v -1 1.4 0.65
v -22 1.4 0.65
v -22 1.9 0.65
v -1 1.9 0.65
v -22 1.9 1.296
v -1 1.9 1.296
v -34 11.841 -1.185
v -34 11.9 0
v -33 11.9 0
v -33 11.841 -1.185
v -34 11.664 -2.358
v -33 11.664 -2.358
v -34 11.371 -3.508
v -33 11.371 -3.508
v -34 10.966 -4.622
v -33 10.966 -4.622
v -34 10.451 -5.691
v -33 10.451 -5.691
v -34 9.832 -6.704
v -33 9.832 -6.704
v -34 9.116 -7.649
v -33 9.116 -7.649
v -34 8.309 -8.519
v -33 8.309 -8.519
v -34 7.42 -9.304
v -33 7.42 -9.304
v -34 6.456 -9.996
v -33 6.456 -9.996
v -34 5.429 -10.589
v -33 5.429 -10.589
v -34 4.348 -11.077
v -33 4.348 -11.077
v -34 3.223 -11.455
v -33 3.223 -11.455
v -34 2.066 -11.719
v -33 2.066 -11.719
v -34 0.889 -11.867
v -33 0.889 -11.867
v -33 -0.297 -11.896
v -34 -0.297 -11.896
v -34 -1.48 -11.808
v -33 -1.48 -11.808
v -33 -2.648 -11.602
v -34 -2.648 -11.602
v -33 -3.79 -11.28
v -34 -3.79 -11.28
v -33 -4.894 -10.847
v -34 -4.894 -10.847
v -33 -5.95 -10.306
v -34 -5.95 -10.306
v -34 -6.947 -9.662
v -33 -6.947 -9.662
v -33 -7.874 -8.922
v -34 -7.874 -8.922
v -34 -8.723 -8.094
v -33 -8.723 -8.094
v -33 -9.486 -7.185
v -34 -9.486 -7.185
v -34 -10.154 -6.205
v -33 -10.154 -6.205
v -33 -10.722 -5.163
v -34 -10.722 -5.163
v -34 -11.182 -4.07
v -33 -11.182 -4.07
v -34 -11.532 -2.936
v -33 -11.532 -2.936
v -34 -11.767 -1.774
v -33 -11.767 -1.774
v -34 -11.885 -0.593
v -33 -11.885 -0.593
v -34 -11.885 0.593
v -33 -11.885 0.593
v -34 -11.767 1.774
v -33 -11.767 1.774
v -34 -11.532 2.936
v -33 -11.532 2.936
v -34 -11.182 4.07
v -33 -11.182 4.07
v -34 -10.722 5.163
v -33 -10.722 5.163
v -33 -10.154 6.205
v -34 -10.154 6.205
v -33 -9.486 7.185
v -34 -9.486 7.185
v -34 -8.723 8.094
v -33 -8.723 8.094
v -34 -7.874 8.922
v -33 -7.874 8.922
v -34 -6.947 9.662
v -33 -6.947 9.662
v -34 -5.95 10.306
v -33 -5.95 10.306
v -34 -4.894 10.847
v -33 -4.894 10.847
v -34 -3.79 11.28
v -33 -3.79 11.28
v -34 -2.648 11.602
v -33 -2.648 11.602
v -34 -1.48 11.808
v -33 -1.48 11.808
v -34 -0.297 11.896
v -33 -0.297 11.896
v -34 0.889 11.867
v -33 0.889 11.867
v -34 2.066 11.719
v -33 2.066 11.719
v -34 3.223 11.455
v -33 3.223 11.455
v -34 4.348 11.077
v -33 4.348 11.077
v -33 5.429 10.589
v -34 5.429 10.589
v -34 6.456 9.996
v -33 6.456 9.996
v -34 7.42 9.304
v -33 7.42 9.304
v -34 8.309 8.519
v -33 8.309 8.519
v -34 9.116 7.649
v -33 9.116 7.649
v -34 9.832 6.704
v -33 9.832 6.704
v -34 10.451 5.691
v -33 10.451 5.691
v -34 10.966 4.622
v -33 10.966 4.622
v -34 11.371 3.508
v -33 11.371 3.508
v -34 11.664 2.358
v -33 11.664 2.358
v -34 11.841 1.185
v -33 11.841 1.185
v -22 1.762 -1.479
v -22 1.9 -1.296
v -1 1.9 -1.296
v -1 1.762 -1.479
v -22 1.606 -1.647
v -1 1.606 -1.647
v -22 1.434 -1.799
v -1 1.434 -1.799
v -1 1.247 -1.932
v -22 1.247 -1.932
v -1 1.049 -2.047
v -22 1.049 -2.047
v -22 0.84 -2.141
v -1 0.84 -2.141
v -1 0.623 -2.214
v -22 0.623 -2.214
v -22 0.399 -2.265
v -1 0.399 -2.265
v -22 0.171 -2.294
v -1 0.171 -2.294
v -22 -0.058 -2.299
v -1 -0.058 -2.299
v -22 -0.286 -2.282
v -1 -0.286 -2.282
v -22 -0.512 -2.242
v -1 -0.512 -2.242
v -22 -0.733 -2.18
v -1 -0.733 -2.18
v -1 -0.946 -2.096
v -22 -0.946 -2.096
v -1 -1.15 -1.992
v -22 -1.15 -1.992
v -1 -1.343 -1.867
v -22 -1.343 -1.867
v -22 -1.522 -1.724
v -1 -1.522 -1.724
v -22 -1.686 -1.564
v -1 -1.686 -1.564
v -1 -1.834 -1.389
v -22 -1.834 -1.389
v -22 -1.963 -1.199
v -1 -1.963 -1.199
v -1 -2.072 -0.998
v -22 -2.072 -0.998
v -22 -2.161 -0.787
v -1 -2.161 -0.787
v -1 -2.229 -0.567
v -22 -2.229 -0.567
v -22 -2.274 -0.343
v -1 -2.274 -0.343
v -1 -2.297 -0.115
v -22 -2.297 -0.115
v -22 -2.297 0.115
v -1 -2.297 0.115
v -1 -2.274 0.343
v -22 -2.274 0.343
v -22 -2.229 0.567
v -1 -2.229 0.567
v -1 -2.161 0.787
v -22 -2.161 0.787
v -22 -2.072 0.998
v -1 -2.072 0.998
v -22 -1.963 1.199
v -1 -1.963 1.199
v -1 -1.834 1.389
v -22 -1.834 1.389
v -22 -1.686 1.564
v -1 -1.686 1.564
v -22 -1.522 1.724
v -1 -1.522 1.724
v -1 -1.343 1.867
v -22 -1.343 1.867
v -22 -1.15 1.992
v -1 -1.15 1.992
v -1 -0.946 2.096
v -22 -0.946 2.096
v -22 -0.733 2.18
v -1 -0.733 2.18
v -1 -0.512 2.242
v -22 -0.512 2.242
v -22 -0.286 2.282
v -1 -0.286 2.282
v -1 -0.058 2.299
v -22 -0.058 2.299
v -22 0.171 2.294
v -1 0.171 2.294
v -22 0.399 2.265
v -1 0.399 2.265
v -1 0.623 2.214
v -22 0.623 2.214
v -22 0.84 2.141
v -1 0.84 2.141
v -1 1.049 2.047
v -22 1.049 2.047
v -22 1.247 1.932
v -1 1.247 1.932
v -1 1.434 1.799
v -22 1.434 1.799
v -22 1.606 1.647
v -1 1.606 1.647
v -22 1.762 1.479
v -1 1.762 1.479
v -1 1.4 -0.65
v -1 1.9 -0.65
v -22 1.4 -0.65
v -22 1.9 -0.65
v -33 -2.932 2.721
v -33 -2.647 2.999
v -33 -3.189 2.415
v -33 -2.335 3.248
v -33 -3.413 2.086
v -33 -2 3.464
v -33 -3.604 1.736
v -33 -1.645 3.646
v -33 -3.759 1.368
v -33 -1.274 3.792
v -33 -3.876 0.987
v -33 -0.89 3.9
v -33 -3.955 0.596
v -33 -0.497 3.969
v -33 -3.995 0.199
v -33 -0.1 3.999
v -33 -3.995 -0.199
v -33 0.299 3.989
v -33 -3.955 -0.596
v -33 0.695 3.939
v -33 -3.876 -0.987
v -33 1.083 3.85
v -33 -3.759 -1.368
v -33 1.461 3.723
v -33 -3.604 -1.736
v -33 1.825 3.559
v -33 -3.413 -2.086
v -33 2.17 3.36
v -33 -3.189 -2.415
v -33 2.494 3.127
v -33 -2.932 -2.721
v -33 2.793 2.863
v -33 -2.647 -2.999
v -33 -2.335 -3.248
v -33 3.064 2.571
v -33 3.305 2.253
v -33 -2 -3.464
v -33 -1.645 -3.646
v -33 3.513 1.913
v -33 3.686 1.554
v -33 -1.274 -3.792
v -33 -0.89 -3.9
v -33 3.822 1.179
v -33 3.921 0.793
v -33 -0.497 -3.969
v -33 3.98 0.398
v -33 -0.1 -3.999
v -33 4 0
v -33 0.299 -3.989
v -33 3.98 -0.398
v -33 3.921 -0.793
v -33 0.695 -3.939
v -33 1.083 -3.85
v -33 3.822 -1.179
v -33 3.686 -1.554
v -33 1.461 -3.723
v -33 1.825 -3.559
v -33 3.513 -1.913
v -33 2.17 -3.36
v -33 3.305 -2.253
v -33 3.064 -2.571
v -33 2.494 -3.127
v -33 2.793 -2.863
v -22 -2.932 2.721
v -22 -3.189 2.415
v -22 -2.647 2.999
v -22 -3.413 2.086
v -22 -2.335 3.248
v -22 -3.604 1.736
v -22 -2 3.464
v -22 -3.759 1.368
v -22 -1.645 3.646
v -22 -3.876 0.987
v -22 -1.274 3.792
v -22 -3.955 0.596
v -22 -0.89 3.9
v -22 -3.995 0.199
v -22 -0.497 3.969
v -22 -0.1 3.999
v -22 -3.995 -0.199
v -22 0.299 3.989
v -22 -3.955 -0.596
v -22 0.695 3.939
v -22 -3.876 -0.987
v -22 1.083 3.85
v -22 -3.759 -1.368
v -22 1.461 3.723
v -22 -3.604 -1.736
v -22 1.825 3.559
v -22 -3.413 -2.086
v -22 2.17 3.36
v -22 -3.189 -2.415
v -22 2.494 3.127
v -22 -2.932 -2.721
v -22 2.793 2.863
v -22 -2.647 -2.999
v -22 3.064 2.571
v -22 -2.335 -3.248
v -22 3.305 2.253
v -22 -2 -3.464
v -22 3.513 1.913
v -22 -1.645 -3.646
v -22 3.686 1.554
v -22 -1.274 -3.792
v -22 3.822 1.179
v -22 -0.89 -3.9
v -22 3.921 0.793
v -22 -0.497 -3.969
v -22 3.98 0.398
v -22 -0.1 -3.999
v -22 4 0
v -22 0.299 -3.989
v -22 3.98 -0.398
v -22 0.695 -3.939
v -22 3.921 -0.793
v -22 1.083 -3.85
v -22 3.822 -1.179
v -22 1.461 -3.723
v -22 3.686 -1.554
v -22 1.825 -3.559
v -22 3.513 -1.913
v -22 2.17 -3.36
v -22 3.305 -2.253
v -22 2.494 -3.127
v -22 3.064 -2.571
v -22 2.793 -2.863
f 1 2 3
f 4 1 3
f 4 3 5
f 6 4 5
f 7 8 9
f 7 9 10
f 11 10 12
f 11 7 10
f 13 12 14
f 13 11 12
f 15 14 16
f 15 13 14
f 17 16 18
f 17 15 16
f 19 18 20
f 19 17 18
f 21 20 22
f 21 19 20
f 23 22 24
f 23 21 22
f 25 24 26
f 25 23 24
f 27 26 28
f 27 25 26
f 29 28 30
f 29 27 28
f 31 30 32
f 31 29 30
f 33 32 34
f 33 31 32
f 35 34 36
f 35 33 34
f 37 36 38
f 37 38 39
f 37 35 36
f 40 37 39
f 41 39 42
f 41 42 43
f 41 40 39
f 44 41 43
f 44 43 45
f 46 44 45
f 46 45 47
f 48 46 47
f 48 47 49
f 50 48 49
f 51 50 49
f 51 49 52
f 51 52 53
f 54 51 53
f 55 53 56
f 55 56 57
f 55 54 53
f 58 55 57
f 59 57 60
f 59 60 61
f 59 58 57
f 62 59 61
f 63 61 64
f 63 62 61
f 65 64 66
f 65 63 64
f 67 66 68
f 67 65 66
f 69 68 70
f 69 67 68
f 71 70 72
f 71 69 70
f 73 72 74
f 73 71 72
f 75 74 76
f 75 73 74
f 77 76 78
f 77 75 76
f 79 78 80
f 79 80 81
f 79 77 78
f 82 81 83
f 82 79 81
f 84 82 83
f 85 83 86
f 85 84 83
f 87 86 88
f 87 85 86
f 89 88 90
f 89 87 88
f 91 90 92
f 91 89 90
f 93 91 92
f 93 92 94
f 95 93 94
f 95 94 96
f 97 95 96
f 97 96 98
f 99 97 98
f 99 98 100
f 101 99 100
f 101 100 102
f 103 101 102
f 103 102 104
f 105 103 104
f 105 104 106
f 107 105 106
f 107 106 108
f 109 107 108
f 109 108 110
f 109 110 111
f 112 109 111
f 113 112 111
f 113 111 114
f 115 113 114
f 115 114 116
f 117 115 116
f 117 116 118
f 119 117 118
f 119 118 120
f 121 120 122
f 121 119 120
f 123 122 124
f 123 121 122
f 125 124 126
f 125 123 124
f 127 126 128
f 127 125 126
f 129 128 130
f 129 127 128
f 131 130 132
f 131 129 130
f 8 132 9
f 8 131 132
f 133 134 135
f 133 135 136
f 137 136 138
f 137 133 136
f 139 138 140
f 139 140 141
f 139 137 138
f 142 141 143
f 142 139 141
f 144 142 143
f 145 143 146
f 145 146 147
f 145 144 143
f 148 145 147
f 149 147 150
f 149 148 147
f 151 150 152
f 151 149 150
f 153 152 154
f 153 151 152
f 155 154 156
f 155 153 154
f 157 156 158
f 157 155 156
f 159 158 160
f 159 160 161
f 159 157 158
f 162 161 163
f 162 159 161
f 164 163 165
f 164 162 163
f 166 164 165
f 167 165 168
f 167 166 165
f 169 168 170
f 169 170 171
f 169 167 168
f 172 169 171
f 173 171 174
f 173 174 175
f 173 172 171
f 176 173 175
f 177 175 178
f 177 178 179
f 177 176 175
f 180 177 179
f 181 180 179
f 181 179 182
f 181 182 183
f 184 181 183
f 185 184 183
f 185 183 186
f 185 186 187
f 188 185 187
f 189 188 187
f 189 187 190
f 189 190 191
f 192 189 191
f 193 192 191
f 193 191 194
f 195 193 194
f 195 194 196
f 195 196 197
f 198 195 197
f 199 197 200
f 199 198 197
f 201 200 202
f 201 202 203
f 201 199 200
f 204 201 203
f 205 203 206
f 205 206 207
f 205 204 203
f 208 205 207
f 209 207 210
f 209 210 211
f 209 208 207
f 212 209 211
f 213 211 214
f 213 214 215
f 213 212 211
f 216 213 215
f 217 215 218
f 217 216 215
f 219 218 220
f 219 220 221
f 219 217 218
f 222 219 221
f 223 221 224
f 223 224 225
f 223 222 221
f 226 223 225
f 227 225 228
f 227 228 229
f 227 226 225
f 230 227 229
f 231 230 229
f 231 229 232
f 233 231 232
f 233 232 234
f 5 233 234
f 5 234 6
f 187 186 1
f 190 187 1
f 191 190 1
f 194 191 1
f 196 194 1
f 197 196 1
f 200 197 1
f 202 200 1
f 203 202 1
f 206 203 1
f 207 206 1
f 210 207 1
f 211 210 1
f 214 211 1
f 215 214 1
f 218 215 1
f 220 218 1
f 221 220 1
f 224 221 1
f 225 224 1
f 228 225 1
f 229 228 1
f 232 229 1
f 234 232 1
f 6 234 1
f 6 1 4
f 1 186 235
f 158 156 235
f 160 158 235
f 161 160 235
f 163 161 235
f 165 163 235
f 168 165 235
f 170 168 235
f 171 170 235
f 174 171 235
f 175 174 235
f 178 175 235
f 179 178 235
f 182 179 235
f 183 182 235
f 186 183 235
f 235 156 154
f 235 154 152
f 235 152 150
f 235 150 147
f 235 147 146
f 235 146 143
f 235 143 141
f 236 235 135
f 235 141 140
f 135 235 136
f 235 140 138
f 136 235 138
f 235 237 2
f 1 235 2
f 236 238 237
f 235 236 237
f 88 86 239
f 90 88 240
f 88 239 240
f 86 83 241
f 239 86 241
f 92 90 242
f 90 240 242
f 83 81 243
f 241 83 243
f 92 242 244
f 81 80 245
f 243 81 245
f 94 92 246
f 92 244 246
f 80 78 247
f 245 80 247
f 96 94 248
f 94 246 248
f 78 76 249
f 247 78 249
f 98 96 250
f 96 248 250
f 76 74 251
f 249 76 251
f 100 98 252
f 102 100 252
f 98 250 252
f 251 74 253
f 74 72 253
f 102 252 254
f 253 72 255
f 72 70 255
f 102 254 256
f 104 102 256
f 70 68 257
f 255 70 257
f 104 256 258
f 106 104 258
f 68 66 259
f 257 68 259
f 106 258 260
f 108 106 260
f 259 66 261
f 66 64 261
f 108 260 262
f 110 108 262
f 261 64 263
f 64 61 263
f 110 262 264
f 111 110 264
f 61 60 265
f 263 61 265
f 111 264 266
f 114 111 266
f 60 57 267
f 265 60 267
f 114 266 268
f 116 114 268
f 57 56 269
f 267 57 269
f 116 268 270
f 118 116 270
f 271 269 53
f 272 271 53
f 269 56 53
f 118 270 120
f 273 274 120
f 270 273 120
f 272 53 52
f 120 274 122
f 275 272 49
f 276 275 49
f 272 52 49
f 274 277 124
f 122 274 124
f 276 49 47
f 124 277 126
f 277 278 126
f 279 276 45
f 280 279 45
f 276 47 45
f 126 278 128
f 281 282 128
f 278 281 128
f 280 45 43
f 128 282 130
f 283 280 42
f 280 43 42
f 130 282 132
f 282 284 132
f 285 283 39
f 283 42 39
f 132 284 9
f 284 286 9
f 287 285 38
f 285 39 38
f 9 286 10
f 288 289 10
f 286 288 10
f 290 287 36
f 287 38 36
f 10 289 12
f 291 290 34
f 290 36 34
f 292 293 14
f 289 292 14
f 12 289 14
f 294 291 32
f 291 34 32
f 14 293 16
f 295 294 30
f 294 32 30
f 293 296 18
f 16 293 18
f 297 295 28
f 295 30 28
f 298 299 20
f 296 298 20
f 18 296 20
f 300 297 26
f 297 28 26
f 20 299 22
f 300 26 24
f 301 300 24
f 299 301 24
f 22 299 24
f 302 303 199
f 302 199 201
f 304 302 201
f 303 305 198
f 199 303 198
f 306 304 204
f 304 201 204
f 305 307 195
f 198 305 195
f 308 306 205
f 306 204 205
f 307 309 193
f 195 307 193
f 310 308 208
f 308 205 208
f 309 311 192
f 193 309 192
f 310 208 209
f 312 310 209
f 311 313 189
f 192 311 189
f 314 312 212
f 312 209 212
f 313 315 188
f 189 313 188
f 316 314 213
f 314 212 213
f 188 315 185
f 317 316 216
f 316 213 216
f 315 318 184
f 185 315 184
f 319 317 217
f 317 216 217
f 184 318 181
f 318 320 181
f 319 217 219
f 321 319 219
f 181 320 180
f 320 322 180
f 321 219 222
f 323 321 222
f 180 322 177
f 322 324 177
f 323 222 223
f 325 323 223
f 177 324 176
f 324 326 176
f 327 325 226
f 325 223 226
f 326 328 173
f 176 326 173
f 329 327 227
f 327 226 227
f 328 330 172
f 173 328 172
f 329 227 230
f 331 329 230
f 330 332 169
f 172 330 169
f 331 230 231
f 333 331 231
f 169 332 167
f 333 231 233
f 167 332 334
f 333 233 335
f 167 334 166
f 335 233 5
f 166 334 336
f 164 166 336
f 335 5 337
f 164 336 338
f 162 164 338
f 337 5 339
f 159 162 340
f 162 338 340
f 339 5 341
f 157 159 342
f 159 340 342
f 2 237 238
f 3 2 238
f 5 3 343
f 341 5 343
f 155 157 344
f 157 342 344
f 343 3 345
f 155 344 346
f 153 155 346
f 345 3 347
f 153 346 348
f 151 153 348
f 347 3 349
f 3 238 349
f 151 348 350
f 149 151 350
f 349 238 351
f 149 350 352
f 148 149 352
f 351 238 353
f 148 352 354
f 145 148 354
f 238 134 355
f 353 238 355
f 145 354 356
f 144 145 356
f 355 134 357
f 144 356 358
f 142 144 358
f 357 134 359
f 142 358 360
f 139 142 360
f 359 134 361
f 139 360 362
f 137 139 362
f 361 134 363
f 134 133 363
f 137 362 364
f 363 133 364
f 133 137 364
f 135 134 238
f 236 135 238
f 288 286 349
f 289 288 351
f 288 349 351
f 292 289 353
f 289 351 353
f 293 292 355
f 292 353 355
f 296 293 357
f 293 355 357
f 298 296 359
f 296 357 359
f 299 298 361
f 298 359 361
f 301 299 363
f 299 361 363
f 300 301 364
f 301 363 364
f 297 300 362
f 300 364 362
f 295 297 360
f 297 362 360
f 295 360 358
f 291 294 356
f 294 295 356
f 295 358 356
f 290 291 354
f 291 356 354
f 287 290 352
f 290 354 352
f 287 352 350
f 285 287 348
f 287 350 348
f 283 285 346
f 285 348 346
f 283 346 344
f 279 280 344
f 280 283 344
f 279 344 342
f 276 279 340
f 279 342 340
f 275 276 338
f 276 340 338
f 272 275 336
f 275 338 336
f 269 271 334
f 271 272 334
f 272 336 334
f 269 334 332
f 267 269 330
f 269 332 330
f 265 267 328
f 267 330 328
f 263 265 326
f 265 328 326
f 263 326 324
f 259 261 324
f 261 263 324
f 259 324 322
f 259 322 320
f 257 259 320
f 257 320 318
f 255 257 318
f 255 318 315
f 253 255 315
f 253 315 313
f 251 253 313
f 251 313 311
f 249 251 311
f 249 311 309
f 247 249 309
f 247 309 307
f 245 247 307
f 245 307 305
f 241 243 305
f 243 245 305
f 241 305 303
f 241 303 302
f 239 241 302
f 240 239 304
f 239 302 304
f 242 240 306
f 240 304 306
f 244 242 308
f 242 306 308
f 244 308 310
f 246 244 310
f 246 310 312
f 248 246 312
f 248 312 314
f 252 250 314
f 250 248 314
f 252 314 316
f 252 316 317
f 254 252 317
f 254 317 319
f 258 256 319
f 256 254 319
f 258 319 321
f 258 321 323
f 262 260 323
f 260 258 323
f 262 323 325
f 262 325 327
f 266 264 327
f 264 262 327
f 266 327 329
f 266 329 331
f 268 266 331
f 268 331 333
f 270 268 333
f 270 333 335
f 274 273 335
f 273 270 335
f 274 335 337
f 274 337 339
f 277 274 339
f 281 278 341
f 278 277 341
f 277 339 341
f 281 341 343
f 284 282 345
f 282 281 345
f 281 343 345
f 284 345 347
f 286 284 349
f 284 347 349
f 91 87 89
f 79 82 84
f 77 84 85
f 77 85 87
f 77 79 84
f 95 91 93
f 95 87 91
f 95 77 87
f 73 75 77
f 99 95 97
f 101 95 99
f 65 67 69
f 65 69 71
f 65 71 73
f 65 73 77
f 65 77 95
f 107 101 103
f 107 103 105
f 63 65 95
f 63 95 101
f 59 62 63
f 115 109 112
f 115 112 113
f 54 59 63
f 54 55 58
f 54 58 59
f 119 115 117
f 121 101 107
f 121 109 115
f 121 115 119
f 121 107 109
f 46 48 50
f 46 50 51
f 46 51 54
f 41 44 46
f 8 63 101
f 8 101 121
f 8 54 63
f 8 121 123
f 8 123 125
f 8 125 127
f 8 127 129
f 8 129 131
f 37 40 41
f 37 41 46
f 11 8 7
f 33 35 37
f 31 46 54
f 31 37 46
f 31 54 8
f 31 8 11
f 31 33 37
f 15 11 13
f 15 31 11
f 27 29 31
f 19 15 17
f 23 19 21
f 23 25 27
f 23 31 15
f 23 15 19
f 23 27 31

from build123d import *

# Parameters (mm, degrees)
SKETCH017_R             = 4
PAD005_DEPTH            = 12
PAD006_DEPTH            = 21
SKETCH020_R             = 11.9
PAD007_DEPTH            = 1
BODY004_PLACEMENT_ANGLE = 180


with BuildPart() as part:
    # Sketch017 → Pad005 (new body)
    with BuildSketch(Plane.YZ):
        Circle(SKETCH017_R)
    extrude(amount=PAD005_DEPTH)

    # Sketch018 → Pad006 (join)
    with BuildSketch(Plane.YZ):
        with BuildLine():
            ThreePointArc((1.9, 1.296148), (-2.3, 0), (1.9, -1.296148))
            Line((1.9, -0.65), (1.9, -1.296148))
            Line((1.4, -0.65), (1.9, -0.65))
            Line((1.4, 0.65), (1.4, -0.65))
            Line((1.9, 0.65), (1.4, 0.65))
            Line((1.9, 1.296148), (1.9, 0.65))
        make_face()
    extrude(amount=-PAD006_DEPTH)

    # Sketch020 (on Face3 of Pad006) → Pad007 (join)
    with BuildSketch(Plane.YZ.offset(12)):
        Circle(SKETCH020_R)
    extrude(amount=-PAD007_DEPTH)


with BuildPart() as part_1:
    # Body004 placement: moved
    add(part.part.moved(Location((-22, 0, 0))).rotate(Axis((-22, 0, 0), (0, 1, 0)), BODY004_PLACEMENT_ANGLE))


solid = part_1.part
